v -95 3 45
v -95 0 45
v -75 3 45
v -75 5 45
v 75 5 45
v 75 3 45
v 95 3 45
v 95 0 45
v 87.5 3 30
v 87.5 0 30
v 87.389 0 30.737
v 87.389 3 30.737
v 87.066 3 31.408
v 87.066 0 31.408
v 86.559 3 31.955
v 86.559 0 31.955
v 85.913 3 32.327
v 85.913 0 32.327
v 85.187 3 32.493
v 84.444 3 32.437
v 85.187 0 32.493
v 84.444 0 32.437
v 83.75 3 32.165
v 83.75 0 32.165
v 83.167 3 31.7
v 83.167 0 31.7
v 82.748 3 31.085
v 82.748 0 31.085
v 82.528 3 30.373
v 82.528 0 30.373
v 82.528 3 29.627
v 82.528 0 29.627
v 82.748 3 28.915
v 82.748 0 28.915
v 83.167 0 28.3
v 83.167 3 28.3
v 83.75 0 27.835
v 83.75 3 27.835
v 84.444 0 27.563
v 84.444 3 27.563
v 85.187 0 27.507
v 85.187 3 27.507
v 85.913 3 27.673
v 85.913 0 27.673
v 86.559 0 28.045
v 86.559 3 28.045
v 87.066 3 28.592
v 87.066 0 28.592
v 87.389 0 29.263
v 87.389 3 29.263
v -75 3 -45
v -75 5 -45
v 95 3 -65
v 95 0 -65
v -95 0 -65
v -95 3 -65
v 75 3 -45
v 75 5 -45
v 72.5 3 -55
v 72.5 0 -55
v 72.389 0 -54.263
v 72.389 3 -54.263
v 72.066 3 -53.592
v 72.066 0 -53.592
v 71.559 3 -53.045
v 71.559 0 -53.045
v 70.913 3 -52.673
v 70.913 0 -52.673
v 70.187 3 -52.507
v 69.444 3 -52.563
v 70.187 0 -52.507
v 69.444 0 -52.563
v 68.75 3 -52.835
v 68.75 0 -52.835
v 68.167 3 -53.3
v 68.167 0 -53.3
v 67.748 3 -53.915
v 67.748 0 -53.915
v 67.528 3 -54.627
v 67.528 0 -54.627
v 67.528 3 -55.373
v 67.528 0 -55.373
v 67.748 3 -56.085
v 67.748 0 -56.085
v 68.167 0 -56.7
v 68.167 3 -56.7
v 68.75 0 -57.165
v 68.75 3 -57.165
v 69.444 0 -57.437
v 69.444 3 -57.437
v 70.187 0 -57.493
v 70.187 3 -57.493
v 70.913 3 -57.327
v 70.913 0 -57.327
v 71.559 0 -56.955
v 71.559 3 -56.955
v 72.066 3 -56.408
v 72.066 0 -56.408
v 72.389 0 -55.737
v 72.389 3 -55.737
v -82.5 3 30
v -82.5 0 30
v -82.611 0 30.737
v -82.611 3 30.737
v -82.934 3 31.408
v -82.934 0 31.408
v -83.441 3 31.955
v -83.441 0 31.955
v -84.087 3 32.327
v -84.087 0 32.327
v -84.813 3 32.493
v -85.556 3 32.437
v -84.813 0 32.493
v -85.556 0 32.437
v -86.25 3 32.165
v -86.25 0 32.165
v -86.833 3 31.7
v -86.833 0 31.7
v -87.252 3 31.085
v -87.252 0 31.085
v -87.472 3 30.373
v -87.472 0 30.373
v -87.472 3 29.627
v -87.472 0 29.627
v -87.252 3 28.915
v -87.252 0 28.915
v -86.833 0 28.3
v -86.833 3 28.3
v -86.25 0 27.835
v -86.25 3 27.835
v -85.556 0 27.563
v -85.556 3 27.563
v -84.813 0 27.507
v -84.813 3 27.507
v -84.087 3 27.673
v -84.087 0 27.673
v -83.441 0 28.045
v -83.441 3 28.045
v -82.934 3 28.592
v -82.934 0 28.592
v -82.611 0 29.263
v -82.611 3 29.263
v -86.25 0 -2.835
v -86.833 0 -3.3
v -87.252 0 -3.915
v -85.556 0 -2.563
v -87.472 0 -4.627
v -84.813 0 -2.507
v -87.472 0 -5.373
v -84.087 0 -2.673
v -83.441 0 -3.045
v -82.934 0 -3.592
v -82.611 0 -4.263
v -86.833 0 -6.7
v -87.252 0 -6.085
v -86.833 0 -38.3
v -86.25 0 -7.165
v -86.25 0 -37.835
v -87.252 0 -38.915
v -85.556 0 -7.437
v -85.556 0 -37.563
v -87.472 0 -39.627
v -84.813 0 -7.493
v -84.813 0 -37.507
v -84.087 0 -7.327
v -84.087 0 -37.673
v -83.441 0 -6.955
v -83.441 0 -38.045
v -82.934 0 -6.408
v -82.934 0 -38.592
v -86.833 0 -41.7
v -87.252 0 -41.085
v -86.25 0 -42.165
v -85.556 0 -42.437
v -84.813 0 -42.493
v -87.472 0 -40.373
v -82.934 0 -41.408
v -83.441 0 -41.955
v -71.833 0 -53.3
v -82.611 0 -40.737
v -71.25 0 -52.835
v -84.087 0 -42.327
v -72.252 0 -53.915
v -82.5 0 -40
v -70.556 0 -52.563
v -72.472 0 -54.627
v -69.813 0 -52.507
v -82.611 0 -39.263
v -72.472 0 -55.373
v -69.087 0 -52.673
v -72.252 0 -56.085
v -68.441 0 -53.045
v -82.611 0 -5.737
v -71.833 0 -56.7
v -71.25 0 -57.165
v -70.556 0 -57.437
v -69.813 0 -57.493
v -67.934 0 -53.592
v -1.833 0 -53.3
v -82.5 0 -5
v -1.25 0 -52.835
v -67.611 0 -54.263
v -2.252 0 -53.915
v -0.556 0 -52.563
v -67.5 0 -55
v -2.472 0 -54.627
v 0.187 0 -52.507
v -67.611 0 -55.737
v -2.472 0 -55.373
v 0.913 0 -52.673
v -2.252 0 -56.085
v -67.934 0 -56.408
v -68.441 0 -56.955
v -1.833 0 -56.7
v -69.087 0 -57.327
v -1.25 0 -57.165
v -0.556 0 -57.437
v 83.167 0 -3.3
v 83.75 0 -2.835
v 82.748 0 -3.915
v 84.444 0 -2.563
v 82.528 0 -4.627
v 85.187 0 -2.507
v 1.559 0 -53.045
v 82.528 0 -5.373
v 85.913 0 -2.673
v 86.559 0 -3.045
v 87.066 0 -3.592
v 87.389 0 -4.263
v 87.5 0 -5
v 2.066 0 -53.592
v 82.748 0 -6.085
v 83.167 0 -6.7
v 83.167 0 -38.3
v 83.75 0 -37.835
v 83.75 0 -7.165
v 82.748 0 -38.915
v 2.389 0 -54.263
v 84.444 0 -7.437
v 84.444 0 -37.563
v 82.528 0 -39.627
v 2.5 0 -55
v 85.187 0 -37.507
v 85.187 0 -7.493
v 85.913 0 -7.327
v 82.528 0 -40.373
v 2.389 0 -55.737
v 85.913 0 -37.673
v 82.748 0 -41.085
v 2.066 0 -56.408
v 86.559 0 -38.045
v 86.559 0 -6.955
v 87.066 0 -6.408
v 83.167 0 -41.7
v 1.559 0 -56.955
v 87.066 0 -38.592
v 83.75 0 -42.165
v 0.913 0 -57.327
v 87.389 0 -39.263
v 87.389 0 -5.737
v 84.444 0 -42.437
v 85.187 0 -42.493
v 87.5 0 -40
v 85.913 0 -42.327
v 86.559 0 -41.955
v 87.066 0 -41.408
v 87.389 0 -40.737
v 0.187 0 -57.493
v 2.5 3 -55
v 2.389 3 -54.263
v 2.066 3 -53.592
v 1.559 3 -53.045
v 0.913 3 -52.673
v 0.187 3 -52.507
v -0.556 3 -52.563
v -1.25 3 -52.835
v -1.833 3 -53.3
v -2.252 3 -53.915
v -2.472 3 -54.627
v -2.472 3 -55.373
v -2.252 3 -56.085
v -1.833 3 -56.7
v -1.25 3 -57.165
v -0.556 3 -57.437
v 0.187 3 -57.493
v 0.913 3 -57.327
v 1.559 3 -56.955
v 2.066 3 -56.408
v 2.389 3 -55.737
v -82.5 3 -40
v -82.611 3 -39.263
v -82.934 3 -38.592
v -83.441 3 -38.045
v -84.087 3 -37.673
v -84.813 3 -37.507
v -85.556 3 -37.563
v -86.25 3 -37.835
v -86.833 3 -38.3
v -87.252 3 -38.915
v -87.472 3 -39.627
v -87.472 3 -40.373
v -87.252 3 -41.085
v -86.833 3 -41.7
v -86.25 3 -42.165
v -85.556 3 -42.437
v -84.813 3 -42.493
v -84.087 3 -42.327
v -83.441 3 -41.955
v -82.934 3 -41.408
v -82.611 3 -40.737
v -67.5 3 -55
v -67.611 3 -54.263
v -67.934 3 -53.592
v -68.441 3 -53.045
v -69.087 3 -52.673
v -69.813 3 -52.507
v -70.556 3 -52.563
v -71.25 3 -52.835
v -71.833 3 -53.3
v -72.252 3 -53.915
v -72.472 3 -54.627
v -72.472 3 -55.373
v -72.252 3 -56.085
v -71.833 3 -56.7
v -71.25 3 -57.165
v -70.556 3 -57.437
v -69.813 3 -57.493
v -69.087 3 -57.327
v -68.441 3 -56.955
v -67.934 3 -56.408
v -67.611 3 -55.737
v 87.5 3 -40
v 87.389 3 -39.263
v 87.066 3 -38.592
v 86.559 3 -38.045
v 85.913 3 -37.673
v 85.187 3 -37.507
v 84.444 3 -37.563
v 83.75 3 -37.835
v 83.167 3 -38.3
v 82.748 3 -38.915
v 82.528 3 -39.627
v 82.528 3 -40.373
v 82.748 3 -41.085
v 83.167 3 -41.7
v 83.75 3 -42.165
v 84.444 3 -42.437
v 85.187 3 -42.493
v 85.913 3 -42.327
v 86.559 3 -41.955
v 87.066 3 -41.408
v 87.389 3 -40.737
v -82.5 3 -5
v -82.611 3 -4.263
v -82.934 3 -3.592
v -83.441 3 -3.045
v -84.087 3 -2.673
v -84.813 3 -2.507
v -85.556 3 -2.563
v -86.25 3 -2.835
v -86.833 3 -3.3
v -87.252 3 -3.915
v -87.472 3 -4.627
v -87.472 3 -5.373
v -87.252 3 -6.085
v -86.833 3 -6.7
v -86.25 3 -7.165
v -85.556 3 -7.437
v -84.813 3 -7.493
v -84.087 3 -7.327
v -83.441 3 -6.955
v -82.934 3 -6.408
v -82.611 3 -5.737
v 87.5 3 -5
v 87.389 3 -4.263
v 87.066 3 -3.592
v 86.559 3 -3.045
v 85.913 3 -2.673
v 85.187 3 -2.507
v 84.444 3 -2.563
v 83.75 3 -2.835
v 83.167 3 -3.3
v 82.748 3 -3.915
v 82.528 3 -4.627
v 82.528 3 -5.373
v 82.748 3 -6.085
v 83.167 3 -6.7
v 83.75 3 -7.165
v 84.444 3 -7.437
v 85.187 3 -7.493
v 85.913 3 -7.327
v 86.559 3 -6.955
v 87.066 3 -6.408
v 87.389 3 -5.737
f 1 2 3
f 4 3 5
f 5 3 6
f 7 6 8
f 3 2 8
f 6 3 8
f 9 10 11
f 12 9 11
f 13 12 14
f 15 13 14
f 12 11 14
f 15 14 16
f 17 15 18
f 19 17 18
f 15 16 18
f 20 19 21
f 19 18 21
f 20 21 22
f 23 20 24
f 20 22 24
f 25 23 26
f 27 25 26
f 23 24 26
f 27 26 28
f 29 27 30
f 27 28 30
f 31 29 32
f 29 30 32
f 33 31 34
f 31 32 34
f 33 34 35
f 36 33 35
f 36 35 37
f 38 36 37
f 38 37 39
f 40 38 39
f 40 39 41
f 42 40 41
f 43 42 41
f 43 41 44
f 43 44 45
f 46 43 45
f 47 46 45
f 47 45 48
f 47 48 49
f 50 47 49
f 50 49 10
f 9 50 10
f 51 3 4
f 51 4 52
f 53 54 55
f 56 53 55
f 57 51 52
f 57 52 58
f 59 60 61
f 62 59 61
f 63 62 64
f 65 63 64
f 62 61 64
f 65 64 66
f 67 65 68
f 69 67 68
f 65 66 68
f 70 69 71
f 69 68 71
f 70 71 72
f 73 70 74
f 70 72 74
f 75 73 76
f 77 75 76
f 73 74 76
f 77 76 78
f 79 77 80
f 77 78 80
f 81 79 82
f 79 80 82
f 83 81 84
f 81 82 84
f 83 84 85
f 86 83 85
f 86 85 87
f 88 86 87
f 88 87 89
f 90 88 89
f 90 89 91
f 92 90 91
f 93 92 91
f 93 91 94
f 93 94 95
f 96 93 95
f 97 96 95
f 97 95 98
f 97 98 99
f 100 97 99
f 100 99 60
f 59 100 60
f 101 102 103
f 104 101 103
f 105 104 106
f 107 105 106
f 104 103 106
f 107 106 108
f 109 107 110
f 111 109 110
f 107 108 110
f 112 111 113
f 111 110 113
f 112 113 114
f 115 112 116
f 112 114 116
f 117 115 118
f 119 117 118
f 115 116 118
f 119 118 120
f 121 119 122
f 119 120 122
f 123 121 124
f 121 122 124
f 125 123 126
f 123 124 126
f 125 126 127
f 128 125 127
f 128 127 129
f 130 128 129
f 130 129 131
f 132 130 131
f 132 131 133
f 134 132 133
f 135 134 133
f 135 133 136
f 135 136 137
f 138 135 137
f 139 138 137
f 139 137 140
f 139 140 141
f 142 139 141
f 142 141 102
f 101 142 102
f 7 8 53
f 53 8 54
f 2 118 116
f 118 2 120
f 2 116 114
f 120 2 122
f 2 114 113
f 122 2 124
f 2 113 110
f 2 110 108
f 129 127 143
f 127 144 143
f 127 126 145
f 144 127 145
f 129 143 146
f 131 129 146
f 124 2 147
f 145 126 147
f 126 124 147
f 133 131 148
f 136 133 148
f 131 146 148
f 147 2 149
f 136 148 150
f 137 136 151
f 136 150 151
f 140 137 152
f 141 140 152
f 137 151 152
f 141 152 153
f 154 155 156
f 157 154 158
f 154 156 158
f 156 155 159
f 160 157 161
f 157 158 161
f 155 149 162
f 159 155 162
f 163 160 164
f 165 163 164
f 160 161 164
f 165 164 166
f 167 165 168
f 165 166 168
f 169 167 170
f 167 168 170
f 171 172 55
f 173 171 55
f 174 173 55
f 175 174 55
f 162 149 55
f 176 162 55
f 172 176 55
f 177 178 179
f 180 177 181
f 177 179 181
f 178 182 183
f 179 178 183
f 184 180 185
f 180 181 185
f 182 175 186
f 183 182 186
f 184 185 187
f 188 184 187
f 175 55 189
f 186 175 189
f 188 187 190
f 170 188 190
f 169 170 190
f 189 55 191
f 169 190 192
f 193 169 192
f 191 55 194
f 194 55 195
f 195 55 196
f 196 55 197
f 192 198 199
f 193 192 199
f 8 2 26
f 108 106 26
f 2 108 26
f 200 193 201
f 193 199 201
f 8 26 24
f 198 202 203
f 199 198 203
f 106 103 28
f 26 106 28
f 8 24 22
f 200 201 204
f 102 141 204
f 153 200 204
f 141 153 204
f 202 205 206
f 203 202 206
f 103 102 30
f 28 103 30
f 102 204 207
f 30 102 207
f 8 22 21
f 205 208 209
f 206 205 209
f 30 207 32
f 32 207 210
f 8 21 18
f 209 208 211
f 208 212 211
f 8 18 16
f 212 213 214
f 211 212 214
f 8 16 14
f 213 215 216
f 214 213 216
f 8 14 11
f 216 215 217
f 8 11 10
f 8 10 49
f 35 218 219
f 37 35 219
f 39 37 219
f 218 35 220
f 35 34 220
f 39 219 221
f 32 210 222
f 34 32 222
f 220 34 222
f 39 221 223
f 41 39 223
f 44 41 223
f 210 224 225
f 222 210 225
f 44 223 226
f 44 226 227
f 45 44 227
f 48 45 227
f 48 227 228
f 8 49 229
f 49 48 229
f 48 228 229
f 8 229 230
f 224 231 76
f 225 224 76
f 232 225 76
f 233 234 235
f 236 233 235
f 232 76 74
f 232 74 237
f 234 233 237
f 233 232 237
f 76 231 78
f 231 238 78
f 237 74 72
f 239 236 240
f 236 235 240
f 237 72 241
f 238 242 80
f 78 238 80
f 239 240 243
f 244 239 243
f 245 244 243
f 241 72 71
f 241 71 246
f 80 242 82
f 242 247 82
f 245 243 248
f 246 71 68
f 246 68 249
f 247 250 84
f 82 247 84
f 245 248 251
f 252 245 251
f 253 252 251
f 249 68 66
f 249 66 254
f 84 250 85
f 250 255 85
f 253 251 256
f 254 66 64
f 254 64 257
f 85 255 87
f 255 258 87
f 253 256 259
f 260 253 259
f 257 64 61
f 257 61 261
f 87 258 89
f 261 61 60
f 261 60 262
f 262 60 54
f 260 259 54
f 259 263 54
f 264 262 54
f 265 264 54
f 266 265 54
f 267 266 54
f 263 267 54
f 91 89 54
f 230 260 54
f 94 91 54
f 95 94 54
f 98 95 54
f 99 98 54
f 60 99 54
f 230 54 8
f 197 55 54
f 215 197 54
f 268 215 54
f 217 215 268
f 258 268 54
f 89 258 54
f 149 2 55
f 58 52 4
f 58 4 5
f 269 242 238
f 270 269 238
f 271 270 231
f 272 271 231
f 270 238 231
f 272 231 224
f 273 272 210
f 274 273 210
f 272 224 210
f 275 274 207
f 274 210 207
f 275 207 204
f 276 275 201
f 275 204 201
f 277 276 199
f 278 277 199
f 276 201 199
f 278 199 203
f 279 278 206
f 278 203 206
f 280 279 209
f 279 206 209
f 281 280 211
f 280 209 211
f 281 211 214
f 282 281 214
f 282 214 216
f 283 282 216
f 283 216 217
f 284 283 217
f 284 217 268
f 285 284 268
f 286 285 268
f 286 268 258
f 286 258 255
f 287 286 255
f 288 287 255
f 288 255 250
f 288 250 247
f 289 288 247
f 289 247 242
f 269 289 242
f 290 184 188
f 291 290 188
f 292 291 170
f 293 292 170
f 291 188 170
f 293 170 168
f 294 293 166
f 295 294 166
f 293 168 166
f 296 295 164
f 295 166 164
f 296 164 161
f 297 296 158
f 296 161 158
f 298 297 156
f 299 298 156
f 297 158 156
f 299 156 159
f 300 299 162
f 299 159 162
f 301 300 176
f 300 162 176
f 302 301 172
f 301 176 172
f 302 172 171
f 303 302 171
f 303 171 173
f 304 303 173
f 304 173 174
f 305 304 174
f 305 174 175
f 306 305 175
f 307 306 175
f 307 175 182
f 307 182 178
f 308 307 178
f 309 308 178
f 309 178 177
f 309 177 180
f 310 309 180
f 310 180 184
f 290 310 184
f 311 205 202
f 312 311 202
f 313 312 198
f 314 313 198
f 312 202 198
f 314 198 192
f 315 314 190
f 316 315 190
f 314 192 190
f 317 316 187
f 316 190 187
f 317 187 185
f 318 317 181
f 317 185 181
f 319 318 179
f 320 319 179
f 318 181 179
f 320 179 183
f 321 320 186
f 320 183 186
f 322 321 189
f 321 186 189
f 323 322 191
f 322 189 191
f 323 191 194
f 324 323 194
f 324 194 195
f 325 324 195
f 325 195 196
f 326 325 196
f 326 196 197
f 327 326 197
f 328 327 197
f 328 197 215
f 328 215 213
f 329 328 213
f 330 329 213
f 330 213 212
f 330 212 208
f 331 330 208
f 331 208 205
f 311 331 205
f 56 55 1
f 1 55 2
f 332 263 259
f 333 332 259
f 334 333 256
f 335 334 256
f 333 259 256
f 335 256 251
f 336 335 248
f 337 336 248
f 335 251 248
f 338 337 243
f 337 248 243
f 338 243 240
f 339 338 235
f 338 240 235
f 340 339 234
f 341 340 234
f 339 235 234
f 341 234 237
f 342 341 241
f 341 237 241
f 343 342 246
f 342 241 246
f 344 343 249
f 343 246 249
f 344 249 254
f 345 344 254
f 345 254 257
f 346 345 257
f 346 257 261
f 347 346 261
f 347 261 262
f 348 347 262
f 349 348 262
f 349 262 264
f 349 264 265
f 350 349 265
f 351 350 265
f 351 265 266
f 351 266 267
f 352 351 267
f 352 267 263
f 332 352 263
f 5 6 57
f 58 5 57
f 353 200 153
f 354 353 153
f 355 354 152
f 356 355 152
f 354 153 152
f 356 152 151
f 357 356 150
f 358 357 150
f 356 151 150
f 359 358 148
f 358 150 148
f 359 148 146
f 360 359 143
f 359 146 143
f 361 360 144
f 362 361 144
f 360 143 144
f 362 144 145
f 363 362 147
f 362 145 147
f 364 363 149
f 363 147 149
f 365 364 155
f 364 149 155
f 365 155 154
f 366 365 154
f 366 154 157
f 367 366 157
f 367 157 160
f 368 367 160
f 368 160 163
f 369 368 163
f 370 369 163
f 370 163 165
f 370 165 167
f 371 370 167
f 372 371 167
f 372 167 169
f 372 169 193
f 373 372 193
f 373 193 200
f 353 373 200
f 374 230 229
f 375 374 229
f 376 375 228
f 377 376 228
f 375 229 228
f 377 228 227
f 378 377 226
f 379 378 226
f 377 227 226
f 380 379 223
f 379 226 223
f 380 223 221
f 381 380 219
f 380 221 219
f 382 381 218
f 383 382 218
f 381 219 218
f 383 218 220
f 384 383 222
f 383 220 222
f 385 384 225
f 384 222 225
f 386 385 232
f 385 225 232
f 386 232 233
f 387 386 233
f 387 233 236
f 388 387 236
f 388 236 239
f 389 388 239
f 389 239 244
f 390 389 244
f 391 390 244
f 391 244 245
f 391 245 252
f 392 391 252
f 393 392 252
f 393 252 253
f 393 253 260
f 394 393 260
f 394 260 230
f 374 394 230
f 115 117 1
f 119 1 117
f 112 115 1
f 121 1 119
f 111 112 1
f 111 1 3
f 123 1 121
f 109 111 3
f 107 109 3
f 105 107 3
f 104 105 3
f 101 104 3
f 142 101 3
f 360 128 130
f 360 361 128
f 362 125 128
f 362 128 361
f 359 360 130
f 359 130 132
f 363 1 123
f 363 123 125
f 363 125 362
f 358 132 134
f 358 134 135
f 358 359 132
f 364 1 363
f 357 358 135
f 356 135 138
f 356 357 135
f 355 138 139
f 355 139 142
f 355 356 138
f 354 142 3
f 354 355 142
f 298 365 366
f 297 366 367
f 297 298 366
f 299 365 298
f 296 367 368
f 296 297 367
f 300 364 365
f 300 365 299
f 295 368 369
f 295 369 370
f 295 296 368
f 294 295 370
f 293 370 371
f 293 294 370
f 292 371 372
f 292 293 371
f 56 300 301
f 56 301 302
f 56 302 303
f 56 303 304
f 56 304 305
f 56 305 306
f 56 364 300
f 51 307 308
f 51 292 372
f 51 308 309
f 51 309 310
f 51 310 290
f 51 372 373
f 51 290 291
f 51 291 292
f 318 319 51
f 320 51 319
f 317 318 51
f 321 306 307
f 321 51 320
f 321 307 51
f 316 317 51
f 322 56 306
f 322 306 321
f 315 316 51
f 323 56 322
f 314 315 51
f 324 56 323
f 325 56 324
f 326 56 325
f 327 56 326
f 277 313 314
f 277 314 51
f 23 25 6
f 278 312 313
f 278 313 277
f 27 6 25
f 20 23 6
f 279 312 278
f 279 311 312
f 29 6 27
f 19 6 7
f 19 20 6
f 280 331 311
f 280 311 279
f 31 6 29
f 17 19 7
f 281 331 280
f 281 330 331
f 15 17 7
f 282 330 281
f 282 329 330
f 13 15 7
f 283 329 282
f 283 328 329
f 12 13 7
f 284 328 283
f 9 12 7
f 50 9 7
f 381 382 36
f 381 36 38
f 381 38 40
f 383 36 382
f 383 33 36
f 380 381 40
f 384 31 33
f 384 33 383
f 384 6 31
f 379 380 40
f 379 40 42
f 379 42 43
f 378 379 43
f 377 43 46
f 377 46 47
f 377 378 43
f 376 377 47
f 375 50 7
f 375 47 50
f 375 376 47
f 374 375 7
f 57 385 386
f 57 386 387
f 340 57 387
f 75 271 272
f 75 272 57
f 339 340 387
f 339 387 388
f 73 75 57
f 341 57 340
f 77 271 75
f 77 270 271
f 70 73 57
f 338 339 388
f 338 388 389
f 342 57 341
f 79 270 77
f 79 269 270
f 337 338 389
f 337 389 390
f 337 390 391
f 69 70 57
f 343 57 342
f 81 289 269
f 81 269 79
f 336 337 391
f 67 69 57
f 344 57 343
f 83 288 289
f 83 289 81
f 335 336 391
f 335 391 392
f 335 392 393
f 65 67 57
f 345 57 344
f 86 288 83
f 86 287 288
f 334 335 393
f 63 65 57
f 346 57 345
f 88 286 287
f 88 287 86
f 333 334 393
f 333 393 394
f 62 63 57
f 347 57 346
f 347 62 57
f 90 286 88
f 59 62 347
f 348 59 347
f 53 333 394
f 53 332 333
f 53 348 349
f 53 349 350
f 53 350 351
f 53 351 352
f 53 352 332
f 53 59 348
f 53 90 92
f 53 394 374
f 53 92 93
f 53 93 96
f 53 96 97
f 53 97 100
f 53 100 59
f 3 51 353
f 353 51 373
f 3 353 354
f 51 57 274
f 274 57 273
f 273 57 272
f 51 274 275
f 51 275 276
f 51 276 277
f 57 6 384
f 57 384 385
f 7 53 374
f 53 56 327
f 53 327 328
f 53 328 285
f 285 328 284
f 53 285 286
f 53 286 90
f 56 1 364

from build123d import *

# Parameters (mm, degrees)
CROQUIS1_W              = 150
CROQUIS1_H              = 90
SALIENTE_EXTRUIR1_DEPTH = 5
SALIENTE_EXTRUIR2_DEPTH = 3
CROQUIS2_R              = 2.5
CORTAR_EXTRUIR1_DEPTH   = 10


with BuildPart() as part:
    # Croquis1 → Saliente-Extruir1 (new body)
    with BuildSketch(Plane(origin=(0, 0, 0), x_dir=(1, 0, 0), z_dir=(0, 1, 0))):
        Rectangle(CROQUIS1_W, CROQUIS1_H)
    extrude(amount=SALIENTE_EXTRUIR1_DEPTH)

    # Croquis1<3> → Saliente-Extruir2 (add)
    with BuildSketch(Plane(origin=(0, 0, 0), x_dir=(1, 0, 0), z_dir=(0, 1, 0))):
        Polygon((-75, -45), (-75, 45), (75, 45), (75, -45), (95, -45), (95, 65), (-95, 65), (-95, -45), align=None)
    extrude(amount=SALIENTE_EXTRUIR2_DEPTH)

    # Croquis2 → Cortar-Extruir1 (cut)
    with BuildSketch(Plane.XZ):
        with Locations((85, 30)):
            Circle(CROQUIS2_R)
        with Locations((70, -55)):
            Circle(CROQUIS2_R)
        with Locations((-85, -40)):
            Circle(CROQUIS2_R)
        with Locations((-85, -5)):
            Circle(CROQUIS2_R)
        with Locations((-85, 30)):
            Circle(CROQUIS2_R)
        with Locations((0, -55)):
            Circle(CROQUIS2_R)
        with Locations((-70, -55)):
            Circle(CROQUIS2_R)
        with Locations((85, -5)):
            Circle(CROQUIS2_R)
        with Locations((85, -40)):
            Circle(CROQUIS2_R)
    extrude(amount=-CORTAR_EXTRUIR1_DEPTH, mode=Mode.SUBTRACT)


solid = part.part
